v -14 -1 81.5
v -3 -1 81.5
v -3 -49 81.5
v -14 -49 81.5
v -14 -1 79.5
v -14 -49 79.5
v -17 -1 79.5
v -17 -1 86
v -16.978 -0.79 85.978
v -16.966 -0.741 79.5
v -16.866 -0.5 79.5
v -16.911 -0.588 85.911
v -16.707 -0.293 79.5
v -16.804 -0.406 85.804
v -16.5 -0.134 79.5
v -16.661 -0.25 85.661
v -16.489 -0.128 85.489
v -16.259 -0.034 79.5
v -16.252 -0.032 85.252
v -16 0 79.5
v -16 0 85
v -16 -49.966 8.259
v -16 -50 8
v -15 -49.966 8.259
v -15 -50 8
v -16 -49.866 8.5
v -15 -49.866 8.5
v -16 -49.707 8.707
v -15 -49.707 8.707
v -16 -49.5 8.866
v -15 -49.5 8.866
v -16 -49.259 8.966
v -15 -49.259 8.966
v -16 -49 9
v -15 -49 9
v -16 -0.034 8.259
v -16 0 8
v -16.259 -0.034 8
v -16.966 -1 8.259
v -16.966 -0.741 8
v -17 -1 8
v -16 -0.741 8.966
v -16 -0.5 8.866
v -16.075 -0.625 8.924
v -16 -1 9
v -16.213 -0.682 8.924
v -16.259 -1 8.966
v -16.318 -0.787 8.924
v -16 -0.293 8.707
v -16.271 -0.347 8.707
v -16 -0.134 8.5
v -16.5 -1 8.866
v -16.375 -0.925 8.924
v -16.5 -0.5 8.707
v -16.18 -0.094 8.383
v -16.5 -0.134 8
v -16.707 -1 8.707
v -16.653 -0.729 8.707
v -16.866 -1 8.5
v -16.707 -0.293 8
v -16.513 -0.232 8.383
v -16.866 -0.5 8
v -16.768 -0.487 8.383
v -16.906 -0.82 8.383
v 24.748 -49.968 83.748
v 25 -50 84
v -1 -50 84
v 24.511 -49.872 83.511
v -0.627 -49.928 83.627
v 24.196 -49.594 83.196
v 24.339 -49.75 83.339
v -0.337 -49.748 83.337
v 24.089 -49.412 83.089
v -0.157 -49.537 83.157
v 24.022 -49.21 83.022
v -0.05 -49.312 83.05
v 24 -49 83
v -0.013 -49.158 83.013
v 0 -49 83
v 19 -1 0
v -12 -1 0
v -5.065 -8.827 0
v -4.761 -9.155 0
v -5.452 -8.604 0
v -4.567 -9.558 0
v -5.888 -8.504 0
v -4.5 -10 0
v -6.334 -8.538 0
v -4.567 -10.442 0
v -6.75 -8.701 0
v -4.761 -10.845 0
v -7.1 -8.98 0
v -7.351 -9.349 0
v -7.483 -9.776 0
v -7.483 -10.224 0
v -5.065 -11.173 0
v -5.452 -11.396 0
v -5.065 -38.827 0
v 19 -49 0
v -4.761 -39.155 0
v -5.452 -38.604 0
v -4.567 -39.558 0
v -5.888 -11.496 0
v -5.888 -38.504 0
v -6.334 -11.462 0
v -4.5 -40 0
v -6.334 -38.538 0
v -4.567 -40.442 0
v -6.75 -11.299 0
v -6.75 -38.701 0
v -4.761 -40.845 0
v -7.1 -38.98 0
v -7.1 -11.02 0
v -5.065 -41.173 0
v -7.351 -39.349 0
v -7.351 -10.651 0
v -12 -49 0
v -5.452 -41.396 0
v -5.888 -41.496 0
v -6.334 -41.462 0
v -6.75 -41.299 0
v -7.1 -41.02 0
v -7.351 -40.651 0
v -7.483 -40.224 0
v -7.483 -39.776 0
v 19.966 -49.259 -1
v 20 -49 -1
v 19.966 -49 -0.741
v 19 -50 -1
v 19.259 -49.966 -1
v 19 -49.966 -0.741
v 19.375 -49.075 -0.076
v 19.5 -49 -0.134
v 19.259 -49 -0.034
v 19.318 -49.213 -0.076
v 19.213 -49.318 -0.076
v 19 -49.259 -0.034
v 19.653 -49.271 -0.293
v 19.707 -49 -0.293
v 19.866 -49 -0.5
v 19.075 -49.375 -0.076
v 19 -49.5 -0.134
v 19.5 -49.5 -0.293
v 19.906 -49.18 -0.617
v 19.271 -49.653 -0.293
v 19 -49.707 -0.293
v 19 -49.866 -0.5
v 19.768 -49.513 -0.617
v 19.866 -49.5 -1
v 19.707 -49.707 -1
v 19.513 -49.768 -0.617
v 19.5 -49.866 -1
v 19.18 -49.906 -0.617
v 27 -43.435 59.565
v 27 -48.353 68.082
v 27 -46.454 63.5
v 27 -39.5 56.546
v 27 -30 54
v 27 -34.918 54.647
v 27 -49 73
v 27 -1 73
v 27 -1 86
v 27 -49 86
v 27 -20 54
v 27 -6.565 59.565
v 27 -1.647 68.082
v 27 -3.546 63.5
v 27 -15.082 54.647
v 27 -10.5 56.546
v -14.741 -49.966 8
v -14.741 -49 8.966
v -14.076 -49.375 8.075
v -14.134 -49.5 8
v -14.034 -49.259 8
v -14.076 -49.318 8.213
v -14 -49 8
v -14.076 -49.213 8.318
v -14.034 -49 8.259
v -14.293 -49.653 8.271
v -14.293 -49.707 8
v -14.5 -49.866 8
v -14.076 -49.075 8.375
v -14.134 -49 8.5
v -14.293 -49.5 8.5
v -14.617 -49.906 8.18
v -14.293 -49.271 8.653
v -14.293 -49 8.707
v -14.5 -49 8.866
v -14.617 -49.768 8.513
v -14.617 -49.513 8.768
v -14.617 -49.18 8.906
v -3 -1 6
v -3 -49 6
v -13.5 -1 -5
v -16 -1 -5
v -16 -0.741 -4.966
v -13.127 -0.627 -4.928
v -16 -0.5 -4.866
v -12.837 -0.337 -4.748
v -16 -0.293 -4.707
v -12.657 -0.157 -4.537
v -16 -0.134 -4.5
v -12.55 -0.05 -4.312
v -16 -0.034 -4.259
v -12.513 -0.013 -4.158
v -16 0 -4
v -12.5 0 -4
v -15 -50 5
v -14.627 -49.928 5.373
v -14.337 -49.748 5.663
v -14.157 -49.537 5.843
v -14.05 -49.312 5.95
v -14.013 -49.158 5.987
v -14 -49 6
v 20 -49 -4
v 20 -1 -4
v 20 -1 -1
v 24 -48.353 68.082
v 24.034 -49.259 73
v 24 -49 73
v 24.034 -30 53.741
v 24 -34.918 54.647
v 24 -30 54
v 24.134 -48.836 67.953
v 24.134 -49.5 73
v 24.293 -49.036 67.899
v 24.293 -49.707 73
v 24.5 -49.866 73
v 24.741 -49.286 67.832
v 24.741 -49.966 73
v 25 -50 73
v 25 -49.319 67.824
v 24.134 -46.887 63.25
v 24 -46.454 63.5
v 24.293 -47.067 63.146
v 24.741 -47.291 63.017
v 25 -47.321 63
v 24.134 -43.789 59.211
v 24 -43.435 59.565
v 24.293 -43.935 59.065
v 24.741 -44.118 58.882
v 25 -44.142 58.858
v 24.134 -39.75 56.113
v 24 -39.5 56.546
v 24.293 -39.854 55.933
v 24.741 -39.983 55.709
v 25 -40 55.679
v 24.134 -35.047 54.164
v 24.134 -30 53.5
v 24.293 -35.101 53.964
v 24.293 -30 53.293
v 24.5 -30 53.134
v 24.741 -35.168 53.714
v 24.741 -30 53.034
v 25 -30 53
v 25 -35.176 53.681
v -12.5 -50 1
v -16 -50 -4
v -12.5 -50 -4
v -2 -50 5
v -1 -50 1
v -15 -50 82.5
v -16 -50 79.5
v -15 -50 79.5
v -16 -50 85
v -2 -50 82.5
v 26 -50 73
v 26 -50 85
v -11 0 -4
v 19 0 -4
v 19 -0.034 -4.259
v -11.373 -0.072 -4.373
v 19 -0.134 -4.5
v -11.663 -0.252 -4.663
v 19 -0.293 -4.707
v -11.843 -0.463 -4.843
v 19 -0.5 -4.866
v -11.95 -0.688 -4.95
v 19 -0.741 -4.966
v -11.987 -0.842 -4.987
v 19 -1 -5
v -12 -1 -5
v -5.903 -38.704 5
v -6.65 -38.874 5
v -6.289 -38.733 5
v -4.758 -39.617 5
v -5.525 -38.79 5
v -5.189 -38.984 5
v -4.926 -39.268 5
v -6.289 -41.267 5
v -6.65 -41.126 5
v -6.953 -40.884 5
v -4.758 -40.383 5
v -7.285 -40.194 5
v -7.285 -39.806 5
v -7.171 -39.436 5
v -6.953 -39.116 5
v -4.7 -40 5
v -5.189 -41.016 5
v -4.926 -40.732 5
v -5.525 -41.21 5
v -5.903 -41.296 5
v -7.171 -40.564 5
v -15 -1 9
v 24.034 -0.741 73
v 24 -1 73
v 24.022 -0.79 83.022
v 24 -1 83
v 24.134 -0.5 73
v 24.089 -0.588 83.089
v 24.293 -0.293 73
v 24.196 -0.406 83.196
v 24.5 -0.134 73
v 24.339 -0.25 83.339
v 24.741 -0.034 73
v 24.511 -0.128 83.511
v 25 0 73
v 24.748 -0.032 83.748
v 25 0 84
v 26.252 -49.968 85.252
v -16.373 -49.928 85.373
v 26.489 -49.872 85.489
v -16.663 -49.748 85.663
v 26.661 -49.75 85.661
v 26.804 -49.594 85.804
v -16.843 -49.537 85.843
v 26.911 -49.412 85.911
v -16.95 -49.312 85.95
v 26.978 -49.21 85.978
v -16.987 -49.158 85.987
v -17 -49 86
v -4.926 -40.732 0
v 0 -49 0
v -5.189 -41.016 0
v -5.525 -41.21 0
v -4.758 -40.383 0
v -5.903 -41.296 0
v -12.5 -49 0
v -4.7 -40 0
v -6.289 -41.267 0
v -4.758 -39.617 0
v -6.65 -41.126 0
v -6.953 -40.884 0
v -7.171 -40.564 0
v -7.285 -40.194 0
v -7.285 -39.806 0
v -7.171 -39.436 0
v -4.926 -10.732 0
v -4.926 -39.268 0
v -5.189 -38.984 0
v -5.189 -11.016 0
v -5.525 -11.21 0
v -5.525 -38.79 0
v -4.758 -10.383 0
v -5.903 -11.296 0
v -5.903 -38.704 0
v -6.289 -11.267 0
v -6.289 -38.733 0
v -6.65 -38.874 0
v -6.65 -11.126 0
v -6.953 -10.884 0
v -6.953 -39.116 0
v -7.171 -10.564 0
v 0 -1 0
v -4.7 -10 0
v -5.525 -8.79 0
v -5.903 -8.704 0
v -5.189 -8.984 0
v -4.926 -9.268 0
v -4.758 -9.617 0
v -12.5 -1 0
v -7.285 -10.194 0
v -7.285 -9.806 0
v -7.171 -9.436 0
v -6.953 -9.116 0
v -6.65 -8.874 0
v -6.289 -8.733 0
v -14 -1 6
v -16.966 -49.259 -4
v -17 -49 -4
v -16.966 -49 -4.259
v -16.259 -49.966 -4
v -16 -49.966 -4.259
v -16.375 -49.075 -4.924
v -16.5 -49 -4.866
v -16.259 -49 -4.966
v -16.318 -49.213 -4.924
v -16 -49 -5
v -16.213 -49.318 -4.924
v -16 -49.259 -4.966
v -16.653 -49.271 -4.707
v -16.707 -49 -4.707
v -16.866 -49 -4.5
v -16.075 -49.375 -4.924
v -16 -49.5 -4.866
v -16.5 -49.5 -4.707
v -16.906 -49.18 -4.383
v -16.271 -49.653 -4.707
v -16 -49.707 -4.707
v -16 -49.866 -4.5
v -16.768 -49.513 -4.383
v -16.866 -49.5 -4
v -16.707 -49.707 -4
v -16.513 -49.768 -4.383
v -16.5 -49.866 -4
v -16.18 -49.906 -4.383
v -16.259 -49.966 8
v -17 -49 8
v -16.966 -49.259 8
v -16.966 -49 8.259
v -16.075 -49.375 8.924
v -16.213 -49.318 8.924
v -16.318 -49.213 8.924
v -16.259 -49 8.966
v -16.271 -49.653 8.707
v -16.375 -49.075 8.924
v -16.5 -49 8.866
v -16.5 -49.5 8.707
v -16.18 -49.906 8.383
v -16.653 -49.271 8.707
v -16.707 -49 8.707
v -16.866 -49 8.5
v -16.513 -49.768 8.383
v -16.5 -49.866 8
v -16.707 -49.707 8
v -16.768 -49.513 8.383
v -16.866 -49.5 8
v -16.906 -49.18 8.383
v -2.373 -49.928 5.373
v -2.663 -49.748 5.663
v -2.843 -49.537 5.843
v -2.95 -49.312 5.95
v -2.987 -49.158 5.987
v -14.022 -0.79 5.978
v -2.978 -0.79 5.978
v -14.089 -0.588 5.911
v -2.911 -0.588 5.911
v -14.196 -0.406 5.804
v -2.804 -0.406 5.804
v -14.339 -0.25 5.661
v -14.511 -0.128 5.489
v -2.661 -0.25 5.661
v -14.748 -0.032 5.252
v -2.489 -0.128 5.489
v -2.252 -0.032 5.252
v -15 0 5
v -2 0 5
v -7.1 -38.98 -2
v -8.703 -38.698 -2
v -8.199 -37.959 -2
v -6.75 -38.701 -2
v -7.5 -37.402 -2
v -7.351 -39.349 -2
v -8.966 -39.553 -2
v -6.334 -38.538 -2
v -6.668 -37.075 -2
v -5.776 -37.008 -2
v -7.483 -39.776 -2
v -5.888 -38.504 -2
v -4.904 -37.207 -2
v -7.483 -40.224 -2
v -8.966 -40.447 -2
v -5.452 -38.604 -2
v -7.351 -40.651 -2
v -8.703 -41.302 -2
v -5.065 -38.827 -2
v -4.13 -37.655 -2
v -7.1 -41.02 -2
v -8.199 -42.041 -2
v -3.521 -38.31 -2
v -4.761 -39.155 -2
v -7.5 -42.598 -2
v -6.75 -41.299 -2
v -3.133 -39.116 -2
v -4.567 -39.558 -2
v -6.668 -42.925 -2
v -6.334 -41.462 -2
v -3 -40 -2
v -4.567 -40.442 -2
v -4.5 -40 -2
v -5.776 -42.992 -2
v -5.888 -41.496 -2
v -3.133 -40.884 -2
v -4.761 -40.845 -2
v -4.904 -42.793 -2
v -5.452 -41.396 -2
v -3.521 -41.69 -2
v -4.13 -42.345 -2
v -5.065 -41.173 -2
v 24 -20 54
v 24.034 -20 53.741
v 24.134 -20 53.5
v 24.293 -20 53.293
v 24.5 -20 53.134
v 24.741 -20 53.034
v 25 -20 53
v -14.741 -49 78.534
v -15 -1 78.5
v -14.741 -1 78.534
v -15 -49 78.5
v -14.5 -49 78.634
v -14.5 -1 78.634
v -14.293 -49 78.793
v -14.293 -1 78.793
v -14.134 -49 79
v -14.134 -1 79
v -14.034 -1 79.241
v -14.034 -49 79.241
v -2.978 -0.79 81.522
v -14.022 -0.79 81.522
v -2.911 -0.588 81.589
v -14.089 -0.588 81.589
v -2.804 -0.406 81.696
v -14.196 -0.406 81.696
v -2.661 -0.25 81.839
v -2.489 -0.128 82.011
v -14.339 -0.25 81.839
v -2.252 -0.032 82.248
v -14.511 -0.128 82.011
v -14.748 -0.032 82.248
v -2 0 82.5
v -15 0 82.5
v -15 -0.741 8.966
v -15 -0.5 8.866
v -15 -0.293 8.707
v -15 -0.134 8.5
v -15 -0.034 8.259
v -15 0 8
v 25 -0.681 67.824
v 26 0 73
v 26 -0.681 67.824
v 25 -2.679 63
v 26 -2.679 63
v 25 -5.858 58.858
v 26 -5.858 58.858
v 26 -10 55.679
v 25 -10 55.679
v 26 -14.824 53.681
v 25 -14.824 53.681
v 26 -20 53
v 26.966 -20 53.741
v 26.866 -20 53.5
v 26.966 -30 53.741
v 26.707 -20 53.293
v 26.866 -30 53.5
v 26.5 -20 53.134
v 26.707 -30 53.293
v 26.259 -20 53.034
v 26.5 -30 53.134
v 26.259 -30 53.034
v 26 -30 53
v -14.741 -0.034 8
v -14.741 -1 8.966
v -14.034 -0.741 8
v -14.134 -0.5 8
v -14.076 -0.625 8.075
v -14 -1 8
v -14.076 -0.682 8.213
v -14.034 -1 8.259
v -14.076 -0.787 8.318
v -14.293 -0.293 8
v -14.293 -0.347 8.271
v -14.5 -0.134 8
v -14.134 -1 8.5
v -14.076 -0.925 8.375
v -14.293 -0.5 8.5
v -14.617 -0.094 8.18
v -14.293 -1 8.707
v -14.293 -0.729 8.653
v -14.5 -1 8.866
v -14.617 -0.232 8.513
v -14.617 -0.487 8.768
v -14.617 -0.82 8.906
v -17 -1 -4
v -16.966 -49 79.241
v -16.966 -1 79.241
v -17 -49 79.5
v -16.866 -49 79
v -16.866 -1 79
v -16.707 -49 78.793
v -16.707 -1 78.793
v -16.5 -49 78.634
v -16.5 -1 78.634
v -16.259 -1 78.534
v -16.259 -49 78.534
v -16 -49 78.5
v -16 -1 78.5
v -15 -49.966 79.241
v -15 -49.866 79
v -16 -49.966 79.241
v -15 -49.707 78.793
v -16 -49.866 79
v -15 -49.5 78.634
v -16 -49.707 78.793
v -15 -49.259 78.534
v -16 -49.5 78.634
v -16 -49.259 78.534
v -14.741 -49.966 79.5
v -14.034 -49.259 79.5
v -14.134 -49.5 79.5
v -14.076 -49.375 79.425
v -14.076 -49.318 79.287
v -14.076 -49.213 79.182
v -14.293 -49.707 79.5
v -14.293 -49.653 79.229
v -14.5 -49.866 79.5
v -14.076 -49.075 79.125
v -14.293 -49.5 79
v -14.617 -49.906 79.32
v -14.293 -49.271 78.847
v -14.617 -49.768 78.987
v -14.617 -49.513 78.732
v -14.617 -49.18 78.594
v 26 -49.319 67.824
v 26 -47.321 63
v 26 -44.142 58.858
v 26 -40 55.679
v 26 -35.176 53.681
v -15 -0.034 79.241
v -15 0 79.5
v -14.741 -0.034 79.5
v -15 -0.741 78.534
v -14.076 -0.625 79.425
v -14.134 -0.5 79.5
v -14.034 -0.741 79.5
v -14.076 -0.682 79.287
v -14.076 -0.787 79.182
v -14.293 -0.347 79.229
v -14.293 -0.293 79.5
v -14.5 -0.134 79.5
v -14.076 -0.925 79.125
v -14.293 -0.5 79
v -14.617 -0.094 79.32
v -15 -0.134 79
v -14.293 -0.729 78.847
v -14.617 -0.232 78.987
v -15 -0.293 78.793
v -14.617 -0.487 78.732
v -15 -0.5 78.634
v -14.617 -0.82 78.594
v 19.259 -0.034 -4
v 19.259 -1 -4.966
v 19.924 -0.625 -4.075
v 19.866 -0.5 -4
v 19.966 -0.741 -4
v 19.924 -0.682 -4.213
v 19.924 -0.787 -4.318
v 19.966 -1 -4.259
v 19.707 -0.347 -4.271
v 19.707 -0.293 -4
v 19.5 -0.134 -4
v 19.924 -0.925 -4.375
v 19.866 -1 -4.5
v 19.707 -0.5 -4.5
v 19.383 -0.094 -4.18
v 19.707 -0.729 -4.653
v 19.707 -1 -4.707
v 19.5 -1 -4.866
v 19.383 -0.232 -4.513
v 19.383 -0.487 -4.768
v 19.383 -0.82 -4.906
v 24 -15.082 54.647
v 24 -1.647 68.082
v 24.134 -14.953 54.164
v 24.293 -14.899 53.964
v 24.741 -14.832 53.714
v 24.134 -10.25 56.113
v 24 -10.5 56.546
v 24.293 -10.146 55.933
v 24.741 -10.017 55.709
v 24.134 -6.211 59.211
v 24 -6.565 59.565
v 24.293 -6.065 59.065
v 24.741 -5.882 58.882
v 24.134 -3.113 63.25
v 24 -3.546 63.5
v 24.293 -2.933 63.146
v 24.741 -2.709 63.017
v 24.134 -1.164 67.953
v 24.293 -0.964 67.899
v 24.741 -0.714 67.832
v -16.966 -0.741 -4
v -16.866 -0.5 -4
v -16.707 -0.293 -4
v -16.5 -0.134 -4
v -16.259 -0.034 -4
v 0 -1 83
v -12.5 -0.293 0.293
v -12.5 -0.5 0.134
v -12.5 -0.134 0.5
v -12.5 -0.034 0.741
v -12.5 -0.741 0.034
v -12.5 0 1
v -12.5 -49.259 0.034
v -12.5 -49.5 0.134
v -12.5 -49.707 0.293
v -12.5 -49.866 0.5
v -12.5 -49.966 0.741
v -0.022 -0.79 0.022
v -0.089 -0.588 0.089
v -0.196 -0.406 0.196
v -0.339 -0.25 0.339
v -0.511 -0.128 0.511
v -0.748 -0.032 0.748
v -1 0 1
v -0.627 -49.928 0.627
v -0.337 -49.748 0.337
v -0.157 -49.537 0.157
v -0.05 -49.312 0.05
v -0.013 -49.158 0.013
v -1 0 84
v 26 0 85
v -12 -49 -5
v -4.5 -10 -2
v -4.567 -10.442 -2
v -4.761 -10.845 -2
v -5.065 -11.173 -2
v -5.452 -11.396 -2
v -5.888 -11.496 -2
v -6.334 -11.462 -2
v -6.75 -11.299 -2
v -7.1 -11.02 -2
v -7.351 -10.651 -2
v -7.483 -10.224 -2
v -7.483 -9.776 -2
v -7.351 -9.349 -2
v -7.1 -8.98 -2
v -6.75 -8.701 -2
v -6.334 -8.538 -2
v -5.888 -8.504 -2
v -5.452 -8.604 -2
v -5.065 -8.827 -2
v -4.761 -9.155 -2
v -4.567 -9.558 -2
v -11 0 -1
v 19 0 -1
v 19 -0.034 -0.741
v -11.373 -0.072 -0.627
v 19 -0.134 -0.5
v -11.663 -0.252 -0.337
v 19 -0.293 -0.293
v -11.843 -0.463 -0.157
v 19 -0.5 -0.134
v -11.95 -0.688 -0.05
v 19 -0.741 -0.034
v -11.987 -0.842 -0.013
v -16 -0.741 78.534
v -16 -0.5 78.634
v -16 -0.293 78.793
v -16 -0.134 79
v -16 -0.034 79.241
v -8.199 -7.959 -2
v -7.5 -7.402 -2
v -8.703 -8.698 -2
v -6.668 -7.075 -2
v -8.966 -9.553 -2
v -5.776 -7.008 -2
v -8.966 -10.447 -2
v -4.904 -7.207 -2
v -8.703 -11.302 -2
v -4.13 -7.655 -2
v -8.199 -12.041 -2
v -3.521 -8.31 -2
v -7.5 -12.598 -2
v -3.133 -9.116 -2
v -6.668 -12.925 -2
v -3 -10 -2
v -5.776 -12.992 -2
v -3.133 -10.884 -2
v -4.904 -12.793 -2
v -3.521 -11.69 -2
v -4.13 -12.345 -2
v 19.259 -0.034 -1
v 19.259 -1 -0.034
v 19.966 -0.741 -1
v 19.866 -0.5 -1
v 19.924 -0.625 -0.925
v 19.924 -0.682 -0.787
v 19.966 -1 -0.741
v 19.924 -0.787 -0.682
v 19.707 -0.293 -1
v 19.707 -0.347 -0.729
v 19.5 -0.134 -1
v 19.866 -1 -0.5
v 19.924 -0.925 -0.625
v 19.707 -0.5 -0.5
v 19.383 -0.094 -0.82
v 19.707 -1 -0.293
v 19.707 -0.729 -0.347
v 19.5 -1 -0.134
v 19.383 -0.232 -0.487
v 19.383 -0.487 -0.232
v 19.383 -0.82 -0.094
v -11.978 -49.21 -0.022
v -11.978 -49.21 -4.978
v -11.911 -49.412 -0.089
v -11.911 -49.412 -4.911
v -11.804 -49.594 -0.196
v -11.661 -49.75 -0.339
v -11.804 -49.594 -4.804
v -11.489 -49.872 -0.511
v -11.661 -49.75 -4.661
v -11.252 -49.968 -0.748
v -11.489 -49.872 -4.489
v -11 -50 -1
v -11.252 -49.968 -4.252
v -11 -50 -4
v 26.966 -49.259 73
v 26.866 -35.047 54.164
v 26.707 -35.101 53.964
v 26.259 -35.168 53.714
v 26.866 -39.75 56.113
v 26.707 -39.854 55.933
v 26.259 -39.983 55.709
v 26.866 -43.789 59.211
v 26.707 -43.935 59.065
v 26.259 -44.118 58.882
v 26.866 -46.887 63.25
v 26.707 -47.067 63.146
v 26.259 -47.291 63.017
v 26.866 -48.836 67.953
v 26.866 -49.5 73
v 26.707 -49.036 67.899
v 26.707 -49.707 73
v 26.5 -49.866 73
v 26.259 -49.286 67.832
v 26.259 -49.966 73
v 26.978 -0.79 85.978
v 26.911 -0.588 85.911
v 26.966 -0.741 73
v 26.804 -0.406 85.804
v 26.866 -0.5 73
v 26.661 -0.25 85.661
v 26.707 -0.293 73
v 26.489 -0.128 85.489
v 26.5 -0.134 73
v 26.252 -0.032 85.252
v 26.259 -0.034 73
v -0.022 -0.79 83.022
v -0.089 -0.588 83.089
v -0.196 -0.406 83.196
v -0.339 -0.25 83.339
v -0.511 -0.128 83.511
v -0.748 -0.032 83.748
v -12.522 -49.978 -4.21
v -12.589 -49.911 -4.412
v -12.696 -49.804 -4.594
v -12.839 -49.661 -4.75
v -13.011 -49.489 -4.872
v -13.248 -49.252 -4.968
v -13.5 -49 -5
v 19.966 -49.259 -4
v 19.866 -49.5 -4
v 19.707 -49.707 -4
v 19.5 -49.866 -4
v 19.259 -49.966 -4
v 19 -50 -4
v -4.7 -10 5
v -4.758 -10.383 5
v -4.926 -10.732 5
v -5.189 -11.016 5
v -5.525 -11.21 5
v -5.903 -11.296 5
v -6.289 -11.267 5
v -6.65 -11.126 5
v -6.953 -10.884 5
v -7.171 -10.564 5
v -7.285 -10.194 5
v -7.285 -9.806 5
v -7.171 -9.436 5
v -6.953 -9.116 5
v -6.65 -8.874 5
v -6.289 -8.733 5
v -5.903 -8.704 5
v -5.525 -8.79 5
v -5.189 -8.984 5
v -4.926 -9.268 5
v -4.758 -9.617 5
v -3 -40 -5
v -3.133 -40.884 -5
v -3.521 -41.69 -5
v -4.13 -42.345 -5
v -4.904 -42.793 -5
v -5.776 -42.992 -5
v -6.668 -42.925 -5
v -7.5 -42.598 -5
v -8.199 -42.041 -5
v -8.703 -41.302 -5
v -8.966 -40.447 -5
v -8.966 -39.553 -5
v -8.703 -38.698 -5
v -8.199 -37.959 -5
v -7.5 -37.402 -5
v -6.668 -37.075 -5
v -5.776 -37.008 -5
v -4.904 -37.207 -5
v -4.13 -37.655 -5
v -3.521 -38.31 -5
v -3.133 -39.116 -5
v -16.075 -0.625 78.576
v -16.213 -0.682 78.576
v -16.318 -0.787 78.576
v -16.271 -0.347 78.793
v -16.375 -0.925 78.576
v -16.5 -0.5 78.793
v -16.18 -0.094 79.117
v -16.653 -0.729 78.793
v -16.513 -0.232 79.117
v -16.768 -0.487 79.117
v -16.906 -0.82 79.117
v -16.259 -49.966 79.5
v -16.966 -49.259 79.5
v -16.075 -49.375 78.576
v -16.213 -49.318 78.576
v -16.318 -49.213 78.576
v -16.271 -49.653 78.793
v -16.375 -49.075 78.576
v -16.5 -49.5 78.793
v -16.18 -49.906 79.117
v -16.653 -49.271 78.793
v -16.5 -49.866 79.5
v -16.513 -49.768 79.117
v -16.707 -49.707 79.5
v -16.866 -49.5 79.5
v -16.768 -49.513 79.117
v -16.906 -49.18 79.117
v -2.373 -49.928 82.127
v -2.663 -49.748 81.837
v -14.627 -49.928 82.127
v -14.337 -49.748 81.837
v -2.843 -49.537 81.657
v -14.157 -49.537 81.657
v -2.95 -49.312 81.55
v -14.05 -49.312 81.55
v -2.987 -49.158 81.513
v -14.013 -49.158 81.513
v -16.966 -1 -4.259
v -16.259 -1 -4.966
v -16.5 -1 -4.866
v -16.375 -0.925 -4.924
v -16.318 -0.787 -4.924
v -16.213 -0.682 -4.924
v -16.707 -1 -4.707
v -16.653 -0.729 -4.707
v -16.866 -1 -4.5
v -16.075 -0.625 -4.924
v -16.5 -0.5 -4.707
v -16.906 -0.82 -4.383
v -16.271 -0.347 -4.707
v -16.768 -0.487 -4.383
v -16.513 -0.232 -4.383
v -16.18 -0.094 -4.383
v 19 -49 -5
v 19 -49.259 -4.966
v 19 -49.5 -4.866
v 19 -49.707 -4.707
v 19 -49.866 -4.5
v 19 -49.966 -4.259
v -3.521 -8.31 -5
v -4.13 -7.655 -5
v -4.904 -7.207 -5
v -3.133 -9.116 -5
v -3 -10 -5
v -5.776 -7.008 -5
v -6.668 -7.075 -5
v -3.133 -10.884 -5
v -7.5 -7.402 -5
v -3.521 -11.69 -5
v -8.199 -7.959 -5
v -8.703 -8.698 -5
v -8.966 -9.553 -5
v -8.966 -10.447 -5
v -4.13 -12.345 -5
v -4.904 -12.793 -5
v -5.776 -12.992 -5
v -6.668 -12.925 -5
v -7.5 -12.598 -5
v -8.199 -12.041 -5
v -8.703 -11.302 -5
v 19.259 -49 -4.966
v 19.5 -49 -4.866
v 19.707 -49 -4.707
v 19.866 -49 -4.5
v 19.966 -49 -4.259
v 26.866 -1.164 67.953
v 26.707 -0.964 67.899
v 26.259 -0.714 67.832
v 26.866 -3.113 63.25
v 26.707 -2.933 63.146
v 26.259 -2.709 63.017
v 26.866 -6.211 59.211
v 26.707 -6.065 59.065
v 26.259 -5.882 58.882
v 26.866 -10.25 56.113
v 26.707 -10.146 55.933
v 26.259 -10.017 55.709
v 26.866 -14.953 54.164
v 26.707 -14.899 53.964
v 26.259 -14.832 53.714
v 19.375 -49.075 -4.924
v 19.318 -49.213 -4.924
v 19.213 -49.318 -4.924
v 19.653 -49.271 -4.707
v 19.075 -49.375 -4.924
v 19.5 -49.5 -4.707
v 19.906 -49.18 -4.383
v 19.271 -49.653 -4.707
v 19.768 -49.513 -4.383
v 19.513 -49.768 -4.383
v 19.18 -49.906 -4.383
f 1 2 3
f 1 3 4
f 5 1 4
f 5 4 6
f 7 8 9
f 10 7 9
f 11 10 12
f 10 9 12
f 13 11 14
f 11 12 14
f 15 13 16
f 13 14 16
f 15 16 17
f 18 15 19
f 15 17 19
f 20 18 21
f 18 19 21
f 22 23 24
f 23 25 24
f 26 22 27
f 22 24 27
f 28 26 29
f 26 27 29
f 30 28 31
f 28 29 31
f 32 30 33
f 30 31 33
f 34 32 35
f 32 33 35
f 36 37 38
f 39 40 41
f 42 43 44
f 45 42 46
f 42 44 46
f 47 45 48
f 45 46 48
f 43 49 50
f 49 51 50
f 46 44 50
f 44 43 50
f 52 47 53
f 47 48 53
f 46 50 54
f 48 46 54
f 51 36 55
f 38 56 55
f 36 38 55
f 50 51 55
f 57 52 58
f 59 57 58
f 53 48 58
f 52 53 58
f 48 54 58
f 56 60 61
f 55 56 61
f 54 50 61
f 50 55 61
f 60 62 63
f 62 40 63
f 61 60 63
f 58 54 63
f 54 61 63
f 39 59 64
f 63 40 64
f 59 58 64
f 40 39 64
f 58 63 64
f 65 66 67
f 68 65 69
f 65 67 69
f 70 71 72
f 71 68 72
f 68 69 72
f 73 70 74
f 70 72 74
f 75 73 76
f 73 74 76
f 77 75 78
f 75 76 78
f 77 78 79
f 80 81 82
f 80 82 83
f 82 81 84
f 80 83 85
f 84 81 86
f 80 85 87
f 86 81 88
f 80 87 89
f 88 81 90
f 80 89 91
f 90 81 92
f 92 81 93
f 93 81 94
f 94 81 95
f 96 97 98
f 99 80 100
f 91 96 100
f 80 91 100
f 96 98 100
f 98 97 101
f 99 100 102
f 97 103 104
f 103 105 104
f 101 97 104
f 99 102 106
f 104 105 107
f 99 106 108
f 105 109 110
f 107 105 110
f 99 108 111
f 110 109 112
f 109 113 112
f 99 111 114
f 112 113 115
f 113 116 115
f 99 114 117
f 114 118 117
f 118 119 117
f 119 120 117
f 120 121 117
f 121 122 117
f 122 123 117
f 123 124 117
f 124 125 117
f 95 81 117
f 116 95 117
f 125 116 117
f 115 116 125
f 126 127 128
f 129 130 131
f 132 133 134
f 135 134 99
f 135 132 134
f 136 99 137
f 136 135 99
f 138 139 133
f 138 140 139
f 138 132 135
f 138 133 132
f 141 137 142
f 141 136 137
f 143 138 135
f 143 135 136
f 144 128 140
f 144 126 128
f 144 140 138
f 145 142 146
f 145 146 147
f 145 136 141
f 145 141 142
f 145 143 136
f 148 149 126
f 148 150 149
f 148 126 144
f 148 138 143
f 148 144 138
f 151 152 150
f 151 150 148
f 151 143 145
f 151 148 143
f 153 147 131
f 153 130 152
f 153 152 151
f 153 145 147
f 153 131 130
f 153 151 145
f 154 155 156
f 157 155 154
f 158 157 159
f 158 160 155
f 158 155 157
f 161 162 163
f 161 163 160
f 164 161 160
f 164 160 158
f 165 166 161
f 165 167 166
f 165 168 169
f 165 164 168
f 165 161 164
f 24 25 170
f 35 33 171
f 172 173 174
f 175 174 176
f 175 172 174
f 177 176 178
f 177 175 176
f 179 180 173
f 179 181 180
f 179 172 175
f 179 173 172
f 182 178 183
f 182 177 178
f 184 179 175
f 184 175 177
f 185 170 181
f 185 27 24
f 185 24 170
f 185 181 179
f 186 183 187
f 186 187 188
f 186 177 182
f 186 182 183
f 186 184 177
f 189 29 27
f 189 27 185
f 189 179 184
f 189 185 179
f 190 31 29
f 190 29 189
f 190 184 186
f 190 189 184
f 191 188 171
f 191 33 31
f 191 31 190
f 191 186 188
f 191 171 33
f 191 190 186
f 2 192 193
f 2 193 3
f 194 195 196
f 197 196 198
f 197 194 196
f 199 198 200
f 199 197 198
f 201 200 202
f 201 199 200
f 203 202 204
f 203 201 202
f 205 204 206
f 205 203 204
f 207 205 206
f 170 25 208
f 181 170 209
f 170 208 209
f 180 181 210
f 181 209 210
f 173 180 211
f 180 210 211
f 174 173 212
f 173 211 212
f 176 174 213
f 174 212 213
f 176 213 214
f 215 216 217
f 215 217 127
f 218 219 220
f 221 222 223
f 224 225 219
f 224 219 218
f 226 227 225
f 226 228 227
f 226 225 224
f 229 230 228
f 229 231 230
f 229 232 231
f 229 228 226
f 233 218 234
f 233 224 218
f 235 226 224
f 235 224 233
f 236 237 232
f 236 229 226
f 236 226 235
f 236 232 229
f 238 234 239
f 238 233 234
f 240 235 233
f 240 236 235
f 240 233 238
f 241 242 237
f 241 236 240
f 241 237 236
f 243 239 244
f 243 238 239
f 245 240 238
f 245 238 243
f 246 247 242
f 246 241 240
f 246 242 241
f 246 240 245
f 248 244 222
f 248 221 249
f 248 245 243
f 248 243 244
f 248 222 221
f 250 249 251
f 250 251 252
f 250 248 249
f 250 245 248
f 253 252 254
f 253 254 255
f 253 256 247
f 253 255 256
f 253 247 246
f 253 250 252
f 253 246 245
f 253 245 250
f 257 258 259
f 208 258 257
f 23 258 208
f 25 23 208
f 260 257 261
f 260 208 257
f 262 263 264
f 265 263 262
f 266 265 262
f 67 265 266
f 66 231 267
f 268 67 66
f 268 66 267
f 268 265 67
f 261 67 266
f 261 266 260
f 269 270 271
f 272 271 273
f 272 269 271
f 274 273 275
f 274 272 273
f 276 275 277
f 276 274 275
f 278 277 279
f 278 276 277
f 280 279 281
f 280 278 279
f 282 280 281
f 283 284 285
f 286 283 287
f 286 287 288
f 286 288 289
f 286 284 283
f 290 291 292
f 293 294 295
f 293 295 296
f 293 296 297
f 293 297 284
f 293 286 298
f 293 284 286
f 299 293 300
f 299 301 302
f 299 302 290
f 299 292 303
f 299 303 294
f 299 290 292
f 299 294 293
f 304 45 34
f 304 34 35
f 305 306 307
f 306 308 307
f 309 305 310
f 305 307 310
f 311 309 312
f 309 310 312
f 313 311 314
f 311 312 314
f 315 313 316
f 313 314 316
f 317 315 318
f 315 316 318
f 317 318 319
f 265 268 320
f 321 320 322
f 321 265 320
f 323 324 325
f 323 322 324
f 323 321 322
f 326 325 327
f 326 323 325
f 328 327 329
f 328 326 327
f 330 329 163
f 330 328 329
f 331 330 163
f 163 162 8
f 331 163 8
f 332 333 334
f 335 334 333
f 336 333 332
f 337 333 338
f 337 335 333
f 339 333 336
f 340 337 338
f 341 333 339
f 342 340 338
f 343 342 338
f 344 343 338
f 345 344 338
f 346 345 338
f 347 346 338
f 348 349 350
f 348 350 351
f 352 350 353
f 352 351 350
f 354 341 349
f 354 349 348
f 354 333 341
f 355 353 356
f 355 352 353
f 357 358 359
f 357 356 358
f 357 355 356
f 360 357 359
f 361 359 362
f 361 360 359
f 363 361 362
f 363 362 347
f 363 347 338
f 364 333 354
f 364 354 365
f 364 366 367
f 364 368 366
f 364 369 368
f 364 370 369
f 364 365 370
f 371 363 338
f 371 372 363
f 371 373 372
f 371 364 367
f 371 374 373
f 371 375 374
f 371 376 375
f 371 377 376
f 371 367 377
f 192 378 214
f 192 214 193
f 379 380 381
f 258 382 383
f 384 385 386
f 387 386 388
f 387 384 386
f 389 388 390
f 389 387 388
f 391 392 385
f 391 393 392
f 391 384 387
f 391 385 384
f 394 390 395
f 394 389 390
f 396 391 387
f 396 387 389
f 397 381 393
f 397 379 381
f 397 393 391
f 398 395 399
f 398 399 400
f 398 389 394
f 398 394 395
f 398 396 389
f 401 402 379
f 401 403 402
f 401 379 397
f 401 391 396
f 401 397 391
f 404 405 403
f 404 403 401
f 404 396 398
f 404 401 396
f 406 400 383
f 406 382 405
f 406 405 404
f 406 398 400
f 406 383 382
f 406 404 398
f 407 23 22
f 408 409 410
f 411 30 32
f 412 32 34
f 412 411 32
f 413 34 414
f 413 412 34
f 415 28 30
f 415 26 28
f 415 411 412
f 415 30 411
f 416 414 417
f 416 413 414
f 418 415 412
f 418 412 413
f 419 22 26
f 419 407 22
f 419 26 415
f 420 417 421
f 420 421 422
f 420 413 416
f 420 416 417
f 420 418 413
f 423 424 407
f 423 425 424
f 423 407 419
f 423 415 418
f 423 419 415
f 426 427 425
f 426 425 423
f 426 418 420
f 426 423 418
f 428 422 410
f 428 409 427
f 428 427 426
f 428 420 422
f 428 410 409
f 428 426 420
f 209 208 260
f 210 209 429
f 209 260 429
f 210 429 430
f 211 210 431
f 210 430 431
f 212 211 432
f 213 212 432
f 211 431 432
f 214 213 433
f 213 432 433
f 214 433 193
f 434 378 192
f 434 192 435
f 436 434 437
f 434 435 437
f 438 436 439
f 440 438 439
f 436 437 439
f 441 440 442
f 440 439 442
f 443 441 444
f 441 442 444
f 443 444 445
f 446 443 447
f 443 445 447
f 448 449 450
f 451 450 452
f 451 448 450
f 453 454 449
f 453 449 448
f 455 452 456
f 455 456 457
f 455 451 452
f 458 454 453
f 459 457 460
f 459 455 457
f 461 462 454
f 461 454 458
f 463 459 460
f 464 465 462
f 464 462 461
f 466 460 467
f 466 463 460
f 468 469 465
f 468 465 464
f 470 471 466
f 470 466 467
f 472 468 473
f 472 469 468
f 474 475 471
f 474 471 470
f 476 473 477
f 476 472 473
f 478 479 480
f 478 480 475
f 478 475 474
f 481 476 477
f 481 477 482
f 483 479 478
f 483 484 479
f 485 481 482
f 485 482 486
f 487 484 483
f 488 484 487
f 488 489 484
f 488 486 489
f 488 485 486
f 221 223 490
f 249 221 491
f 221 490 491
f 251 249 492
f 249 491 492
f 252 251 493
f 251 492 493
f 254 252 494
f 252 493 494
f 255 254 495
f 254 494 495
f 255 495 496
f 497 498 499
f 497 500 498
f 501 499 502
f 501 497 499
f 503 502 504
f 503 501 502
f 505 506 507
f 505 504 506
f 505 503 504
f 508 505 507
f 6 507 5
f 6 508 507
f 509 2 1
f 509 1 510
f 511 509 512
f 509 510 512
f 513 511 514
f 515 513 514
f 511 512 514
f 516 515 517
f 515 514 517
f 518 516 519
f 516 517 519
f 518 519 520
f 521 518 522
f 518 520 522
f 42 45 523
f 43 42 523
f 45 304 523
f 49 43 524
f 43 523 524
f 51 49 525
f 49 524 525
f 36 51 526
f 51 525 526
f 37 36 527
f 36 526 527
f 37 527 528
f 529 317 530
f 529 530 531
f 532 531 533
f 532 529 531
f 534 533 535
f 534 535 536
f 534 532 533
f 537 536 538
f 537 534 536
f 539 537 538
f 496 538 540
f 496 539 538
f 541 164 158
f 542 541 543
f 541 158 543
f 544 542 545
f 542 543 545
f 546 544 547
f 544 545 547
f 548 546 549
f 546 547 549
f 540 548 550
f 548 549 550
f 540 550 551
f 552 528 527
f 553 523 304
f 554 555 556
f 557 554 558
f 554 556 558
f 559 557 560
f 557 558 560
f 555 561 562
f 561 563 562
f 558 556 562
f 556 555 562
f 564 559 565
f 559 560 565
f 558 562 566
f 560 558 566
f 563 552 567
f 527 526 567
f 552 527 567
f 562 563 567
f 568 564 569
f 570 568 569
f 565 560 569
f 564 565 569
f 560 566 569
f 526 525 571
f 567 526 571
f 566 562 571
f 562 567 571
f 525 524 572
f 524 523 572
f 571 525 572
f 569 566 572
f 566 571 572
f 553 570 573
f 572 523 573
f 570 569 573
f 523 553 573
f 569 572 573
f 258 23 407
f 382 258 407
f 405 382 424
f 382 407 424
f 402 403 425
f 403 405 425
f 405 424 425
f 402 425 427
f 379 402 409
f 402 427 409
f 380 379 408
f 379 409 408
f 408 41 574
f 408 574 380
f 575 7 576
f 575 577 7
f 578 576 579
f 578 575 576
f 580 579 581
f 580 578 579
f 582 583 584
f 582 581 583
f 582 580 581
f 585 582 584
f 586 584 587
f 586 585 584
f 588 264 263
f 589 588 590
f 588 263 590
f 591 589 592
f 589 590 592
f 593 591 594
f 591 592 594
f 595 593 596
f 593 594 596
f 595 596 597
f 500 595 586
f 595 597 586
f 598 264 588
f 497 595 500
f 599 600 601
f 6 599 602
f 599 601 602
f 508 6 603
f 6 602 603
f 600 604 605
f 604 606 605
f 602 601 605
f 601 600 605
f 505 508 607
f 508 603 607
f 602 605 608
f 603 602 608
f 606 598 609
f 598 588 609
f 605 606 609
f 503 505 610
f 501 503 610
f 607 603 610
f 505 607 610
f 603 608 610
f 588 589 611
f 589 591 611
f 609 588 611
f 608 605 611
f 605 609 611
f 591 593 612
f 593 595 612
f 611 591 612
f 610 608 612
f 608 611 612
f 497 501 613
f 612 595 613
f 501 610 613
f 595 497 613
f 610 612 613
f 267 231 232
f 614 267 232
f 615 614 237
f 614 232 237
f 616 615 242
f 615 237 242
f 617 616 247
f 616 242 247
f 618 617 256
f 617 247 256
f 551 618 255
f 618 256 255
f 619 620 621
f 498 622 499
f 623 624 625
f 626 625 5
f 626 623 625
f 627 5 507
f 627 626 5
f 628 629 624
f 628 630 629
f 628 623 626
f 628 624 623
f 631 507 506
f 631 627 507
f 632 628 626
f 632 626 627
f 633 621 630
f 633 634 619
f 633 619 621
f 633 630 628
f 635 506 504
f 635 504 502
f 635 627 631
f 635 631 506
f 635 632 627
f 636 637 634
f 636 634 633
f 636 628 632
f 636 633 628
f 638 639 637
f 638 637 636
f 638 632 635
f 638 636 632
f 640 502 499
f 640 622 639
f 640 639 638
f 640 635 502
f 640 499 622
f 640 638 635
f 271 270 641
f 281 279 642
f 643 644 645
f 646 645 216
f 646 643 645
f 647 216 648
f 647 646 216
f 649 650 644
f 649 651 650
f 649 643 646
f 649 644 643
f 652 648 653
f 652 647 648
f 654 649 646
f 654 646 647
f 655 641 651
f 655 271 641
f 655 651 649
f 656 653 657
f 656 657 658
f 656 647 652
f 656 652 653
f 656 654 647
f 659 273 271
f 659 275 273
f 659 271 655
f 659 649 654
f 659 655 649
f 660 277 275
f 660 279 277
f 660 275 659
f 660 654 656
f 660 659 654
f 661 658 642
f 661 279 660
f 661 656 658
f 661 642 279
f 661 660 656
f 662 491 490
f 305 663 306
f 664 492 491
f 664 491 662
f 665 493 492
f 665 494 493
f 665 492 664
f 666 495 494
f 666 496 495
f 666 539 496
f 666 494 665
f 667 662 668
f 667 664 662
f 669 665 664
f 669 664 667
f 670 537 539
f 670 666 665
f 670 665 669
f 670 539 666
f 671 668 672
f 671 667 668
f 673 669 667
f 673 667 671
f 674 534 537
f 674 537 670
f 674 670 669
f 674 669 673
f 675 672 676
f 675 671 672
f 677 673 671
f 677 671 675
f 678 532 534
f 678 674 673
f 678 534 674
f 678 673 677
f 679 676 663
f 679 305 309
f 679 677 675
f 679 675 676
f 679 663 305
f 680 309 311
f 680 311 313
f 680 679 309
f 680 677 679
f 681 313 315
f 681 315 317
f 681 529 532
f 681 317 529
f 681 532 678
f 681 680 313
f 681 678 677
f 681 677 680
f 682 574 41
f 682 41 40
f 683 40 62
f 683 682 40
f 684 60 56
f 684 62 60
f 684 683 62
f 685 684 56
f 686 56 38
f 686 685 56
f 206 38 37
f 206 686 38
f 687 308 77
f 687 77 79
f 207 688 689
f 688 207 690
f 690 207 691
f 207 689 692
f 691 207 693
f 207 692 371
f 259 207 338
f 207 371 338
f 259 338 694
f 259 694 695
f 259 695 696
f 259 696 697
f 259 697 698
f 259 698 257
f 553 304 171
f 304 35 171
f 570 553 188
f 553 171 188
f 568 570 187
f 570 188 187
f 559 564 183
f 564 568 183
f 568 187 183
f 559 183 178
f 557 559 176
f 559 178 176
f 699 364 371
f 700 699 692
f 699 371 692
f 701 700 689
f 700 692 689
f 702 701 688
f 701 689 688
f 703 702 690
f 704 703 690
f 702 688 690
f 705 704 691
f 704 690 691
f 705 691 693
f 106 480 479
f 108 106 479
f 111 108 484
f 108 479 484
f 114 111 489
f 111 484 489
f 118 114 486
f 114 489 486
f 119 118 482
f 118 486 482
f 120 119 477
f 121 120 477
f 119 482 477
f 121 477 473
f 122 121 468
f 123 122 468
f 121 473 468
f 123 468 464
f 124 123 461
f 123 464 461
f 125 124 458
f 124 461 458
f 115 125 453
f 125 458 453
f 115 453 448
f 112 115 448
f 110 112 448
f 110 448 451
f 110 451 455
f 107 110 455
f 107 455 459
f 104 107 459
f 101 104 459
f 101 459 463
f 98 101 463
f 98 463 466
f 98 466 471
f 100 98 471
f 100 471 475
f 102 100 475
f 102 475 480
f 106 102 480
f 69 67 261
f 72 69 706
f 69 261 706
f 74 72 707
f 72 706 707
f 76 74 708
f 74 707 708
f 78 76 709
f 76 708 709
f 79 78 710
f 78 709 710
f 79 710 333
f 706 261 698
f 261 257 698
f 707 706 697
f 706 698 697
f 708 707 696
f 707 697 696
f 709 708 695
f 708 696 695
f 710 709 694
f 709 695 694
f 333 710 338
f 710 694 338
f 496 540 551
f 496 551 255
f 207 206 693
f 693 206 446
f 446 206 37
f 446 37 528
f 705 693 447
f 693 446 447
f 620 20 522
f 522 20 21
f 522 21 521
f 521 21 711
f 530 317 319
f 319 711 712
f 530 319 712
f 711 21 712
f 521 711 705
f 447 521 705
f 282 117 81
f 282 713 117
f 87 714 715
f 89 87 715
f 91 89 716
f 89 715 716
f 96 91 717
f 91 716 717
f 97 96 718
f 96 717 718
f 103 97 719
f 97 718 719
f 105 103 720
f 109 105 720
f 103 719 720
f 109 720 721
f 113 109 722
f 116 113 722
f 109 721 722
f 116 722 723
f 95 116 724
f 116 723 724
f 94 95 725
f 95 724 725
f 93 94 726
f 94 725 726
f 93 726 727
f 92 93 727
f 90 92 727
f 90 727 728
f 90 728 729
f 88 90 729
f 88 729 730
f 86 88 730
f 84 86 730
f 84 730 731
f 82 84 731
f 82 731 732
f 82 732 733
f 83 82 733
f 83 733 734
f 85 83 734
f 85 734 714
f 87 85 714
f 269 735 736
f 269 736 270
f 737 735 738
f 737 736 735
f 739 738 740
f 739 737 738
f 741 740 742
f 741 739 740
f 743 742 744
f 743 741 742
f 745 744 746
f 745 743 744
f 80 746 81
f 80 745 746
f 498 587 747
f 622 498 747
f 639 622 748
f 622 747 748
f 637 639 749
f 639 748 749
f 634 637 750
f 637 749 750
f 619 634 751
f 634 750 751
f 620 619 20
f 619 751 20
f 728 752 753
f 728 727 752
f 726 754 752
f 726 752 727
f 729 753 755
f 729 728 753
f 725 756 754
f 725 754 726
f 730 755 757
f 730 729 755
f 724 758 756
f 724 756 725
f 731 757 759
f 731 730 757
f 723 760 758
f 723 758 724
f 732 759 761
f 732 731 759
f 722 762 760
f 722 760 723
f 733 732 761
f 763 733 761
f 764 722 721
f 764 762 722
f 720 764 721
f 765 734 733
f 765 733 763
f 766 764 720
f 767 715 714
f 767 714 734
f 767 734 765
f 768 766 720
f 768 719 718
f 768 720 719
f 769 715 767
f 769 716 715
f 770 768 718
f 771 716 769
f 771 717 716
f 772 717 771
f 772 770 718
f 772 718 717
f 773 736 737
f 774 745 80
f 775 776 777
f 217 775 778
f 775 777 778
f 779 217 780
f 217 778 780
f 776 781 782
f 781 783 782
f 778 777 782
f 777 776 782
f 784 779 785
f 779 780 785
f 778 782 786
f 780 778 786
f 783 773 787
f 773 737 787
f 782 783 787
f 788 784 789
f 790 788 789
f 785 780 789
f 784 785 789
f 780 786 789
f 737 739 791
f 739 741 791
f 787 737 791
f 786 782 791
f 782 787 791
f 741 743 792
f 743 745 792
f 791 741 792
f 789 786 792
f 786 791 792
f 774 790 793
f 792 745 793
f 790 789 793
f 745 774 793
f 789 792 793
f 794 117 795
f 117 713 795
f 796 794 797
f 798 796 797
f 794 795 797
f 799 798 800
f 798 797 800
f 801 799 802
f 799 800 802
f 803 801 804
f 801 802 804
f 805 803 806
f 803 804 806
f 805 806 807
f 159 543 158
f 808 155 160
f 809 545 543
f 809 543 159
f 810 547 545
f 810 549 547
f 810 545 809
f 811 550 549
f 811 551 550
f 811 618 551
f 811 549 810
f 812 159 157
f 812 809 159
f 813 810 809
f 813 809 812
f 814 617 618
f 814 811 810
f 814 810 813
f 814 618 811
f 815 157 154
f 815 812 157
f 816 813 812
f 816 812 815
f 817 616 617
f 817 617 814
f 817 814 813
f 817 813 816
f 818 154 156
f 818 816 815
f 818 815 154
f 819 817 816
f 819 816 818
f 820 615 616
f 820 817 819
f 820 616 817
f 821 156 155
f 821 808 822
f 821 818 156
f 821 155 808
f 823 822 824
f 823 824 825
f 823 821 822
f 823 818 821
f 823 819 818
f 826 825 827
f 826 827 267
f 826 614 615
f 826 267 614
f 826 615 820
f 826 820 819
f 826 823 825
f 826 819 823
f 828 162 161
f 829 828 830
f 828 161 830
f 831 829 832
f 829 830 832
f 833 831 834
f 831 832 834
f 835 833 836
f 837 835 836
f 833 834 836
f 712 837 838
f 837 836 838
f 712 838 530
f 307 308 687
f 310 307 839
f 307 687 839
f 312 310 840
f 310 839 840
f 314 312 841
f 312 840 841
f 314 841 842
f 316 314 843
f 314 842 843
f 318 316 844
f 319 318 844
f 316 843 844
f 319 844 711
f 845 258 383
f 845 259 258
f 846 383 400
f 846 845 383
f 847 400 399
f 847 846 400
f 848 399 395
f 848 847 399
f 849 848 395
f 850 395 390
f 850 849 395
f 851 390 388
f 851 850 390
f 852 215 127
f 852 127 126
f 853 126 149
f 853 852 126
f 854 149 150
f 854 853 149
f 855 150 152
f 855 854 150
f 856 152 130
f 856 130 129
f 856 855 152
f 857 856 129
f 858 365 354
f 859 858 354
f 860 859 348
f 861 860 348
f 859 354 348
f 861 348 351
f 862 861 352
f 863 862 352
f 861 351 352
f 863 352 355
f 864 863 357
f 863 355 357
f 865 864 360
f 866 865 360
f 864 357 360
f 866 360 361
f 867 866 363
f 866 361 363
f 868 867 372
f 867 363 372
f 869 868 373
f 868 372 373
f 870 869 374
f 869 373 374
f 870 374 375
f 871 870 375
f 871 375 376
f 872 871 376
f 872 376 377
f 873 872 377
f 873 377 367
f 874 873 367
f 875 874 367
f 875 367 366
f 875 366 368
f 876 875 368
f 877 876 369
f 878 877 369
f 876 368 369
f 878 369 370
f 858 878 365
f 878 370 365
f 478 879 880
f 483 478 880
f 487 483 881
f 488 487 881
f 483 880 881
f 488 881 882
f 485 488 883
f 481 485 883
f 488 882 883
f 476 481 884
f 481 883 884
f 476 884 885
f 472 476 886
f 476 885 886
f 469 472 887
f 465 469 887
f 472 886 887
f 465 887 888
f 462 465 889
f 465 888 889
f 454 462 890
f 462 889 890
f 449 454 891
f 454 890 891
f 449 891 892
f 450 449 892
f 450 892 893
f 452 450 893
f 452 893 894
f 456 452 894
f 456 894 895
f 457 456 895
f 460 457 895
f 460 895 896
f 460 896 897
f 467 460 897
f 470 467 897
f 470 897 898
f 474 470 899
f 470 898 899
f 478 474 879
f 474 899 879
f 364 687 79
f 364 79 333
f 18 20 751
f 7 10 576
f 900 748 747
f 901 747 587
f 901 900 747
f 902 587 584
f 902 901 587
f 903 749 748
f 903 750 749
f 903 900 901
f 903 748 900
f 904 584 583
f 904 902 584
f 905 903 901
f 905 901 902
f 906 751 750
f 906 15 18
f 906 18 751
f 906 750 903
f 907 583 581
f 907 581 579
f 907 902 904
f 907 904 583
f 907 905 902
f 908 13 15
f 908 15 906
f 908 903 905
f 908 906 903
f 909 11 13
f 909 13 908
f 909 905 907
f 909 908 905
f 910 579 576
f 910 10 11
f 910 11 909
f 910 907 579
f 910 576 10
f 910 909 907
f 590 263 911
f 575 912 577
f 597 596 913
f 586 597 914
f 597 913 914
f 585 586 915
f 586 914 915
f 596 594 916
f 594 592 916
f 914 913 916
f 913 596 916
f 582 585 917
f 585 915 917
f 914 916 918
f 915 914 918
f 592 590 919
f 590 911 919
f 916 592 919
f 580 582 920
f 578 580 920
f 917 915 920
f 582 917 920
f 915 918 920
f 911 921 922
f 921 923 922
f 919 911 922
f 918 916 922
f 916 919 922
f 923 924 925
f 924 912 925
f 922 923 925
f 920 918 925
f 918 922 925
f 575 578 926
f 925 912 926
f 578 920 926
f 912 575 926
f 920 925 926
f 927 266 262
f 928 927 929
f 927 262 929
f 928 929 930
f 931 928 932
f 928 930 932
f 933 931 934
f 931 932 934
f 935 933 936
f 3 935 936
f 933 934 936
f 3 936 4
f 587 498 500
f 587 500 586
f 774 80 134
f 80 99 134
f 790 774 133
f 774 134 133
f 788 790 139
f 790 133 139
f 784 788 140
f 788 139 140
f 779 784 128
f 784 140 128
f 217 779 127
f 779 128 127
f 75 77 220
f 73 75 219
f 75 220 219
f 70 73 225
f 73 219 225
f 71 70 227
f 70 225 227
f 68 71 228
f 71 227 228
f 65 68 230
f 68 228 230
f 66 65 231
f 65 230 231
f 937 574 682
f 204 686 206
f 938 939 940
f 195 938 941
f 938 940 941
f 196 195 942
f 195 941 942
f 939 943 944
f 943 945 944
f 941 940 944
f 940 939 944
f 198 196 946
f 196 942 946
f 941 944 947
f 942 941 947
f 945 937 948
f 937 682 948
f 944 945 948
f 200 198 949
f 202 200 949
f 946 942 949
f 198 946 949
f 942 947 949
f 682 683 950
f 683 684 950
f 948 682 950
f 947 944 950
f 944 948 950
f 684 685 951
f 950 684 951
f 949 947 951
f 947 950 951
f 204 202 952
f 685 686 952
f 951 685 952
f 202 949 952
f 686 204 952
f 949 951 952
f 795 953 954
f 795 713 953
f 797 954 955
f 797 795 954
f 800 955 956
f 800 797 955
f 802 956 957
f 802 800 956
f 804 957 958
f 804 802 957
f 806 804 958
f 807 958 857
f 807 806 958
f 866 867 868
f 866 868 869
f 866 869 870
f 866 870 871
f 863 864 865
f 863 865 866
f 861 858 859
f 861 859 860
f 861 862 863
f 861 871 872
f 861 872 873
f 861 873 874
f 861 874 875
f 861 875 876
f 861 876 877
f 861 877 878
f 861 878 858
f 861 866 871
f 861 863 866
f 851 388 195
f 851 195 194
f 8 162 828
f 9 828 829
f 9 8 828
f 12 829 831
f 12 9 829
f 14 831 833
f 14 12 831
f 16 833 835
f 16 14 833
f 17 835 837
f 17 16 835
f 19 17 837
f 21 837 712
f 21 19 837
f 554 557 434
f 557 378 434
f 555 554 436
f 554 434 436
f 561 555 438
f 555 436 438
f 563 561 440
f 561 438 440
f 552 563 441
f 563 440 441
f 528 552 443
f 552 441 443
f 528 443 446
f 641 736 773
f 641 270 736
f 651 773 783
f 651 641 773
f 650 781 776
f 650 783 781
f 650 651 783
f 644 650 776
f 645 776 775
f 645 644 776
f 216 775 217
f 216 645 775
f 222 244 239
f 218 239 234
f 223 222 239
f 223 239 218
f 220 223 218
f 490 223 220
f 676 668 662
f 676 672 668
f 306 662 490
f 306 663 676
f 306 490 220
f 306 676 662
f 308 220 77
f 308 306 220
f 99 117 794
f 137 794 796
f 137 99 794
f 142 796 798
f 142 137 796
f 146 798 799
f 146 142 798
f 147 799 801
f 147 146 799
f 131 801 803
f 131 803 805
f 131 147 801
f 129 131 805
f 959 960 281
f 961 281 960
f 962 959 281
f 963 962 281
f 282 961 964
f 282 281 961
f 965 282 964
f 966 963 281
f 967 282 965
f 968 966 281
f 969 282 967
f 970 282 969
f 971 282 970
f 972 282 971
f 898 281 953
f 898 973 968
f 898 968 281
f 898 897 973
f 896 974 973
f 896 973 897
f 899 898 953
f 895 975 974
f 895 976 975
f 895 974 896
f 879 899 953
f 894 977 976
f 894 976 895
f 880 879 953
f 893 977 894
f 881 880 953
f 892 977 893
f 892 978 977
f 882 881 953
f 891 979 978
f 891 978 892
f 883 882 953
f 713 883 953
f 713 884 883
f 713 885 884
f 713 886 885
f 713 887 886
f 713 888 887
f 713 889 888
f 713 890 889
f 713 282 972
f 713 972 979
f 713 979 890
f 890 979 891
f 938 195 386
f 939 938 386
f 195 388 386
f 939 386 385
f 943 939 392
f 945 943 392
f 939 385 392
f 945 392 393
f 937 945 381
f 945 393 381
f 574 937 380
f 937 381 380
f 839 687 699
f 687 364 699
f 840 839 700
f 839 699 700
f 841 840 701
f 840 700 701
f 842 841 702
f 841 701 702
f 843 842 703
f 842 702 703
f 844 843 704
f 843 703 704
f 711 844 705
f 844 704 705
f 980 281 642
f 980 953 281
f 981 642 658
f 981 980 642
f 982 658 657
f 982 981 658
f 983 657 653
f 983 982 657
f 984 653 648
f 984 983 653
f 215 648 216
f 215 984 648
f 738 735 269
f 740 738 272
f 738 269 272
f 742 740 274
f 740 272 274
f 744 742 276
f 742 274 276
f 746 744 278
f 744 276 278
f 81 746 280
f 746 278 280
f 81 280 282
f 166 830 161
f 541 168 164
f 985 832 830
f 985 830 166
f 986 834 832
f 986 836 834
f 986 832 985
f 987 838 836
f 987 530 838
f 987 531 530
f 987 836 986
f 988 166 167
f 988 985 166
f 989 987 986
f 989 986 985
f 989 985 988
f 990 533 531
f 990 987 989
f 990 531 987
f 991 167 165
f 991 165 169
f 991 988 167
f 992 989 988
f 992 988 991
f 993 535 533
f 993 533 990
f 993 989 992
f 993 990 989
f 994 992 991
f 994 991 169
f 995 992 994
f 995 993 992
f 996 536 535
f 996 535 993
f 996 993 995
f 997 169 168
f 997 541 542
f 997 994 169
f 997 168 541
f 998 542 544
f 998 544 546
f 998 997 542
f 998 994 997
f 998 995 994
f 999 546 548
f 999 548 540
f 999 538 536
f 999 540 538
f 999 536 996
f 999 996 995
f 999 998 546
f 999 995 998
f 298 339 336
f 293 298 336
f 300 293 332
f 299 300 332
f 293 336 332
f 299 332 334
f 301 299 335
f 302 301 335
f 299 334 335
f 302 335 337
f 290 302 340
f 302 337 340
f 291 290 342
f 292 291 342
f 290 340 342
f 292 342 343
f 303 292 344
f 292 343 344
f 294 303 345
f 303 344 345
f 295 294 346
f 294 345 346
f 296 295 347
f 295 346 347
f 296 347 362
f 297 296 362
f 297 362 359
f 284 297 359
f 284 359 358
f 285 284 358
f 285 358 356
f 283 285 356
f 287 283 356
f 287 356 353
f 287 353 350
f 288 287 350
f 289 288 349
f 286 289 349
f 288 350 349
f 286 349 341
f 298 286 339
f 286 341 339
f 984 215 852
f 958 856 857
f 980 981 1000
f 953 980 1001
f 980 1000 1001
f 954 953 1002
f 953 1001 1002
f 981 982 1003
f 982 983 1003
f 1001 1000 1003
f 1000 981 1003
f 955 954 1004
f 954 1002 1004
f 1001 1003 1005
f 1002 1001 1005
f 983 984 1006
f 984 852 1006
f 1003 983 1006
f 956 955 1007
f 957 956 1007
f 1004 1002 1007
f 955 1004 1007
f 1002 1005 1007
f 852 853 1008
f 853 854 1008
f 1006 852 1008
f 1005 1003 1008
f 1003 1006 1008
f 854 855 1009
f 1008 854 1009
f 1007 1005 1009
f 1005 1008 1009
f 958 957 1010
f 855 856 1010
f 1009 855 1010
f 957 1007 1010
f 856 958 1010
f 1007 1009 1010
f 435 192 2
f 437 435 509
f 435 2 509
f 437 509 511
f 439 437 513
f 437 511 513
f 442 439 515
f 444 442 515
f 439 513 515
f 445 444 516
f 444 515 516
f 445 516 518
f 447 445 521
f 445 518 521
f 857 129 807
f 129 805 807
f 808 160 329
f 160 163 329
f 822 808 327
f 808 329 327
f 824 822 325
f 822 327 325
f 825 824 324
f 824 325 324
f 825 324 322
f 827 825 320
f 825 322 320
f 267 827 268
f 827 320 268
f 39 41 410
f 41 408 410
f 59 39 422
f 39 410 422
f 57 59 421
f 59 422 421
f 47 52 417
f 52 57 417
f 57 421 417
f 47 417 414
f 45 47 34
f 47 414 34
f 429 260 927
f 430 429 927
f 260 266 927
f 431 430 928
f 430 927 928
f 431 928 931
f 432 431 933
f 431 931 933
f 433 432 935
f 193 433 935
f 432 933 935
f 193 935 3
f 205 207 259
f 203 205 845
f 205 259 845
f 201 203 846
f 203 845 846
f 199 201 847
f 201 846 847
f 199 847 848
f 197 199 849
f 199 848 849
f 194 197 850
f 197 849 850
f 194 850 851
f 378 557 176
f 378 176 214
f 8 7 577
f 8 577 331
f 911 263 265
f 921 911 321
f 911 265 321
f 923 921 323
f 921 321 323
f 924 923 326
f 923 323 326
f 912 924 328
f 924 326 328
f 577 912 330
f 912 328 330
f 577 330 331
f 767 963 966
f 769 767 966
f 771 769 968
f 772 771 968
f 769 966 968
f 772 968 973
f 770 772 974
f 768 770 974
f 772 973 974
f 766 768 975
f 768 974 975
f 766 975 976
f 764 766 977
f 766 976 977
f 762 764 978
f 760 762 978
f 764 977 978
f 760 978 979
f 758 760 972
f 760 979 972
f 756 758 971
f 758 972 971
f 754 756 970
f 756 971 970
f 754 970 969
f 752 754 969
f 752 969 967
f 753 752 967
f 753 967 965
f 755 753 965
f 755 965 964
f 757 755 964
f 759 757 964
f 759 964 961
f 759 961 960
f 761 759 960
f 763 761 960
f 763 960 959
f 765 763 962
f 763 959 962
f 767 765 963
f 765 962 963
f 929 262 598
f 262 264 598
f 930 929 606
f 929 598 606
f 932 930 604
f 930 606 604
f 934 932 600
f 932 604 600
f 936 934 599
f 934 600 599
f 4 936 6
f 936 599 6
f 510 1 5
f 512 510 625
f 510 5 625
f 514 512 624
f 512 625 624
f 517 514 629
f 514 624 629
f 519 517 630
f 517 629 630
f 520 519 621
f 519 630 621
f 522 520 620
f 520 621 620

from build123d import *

# Parameters (mm, degrees)
PAD_DEPTH       = 50
SKETCH002_W     = 4.5
SKETCH002_H     = 50
PAD003_DEPTH    = 5
SKETCH005_R     = 1.3
POCKET003_DEPTH = 5
FILLET001_R     = 20
FILLET002_R     = 1
SKETCH001_W     = 17
SKETCH001_H     = 50
PAD001_DEPTH    = 5
PAD001_FACE4_W  = 50
PAD001_FACE4_H  = 5
PAD002_DEPTH    = 20
PAD002_FACE3_W  = 50
PAD002_FACE3_H  = 5
POCKET_DEPTH    = 5
SKETCH003_R     = 3
POCKET001_DEPTH = 3
SKETCH004_R     = 1.5
POCKET002_DEPTH = 5
FILLET_R        = 1


with BuildPart() as smartphoneklemme:
    # Sketch → Pad (new body)
    with BuildSketch(Plane.XZ):
        Polygon((0, 0), (-17, 0), (-17, 9), (-14, 9), (-14, 6), (-3, 6), (-3, 81.5), (-14, 81.5), (-14, 78.5), (-17, 78.5), (-17, 86), (-3, 86), (27, 86), (27, 53), (24, 53), (24, 83), (0, 83), align=None)
    extrude(amount=PAD_DEPTH)

    # Sketch002 (on Face1 of Pad) → Pad003 (join)
    with BuildSketch(Plane(origin=(0, 0, 0), x_dir=(1, 0, 0), z_dir=(0, 0, -1))):
        with Locations((-14.75, 25)):
            Rectangle(SKETCH002_W, SKETCH002_H)
    extrude(amount=PAD003_DEPTH)

    # Sketch005 (on Face1 of Pad003) → Pocket003 (cut)
    with BuildSketch(Plane(origin=(0, 0, 0), x_dir=(1, 0, 0), z_dir=(0, 0, -1))):
        with Locations((-6, 40)):
            Circle(SKETCH005_R)
        with Locations((-6, 10)):
            Circle(SKETCH005_R)
    extrude(amount=-POCKET003_DEPTH, mode=Mode.SUBTRACT)

    # Fillet001
    fillet001_edges = [smartphoneklemme.edges().sort_by_distance(p)[0] for p in [
        (25.5, -50, 53),
        (25.5, 0, 53),
    ]]
    fillet(fillet001_edges, radius=FILLET001_R)

    # Fillet002
    fillet002_edges = [smartphoneklemme.edges().sort_by_distance(p)[0] for p in [
        (27, 0, 79.5),
        (25.5, 0, 73),
        (12, 0, 86),
        (24, 0, 78),
        (-10, 0, 86),
        (12, 0, 83),
        (-17, 0, 82.25),
        (0, 0, 41.5),
        (-15.5, 0, 78.5),
        (-6.25, 0, 0),
        (-14, 0, 80),
        (-14.75, 0, 0),
        (-8.5, 0, 81.5),
        (-17, 0, 4.5),
        (-3, 0, 43.75),
        (-15.5, 0, 9),
        (-8.5, 0, 6),
        (-14, 0, 7.5),
        (27, -50, 79.5),
        (25.5, -50, 73),
        (12, -50, 86),
        (24, -50, 78),
        (-10, -50, 86),
        (12, -50, 83),
        (-17, -50, 82.25),
        (0, -50, 41.5),
        (-15.5, -50, 78.5),
        (-6.25, -50, 0),
        (-14, -50, 80),
        (-14.75, -50, 0),
        (-8.5, -50, 81.5),
        (-17, -50, 4.5),
        (-3, -50, 43.75),
        (-15.5, -50, 9),
        (-8.5, -50, 6),
        (-14, -50, 7.5),
        (-14, -25, 78.5),
        (-17, -25, 78.5),
        (-17, -25, -5),
        (-14.75, 0, -5),
        (-12.5, -25, -5),
        (-14.75, -50, -5),
        (-17, -25, 9),
        (-14, -25, 9),
    ]]
    fillet(fillet002_edges, radius=FILLET002_R)


with BuildPart() as klemmplatte:
    # Sketch001 → Pad001 (new body)
    with BuildSketch(Plane.XY):
        with Locations((-8.5, -25)):
            Rectangle(SKETCH001_W, SKETCH001_H)
    extrude(amount=-PAD001_DEPTH)

    # Pad001 Face4 → Pad002 (add)
    with BuildSketch(Plane(origin=(0, -25, -2.5), x_dir=(0, -1, 0), z_dir=(1, 0, 0))):
        Rectangle(PAD001_FACE4_W, PAD001_FACE4_H)
    extrude(amount=PAD002_DEPTH)

    # Pad002 Face3 → Pocket (cut)
    with BuildSketch(Plane(origin=(-17, -25, -2.5), x_dir=(0, 1, 0), z_dir=(-1, 0, 0))):
        Rectangle(PAD002_FACE3_W, PAD002_FACE3_H)
    extrude(amount=-POCKET_DEPTH, mode=Mode.SUBTRACT)

    # Sketch003 (on Face4 of Pocket) → Pocket001 (cut)
    with BuildSketch(Plane(origin=(0, 0, -5), x_dir=(1, 0, 0), z_dir=(0, 0, -1))):
        with Locations((-6, 40)):
            Circle(SKETCH003_R)
        with Locations((-6, 10)):
            Circle(SKETCH003_R)
    extrude(amount=-POCKET001_DEPTH, mode=Mode.SUBTRACT)

    # Sketch004 (on Face13 of Pocket001) → Pocket002 (cut)
    with BuildSketch(Plane(origin=(0, 0, -2), x_dir=(1, 0, 0), z_dir=(0, 0, -1))):
        with Locations((-6, 10)):
            Circle(SKETCH004_R)
        with Locations((-6, 40)):
            Circle(SKETCH004_R)
    extrude(amount=-POCKET002_DEPTH, mode=Mode.SUBTRACT)

    # Fillet
    fillet_edges = [klemmplatte.edges().sort_by_distance(p)[0] for p in [
        (10, 0, 0),
        (10, 0, -5),
        (0, 0, -2.5),
        (20, 0, -2.5),
        (-6, 0, 0),
        (-12, 0, -2.5),
        (-6, 0, -5),
        (20, -50, -2.5),
        (20, -25, 0),
        (20, -25, -5),
        (10, -50, 0),
        (10, -50, -5),
        (0, -50, -2.5),
        (-6, -50, 0),
        (-6, -50, -5),
        (-12, -50, -2.5),
    ]]
    fillet(fillet_edges, radius=FILLET_R)


solid = Compound([smartphoneklemme.part, klemmplatte.part])
